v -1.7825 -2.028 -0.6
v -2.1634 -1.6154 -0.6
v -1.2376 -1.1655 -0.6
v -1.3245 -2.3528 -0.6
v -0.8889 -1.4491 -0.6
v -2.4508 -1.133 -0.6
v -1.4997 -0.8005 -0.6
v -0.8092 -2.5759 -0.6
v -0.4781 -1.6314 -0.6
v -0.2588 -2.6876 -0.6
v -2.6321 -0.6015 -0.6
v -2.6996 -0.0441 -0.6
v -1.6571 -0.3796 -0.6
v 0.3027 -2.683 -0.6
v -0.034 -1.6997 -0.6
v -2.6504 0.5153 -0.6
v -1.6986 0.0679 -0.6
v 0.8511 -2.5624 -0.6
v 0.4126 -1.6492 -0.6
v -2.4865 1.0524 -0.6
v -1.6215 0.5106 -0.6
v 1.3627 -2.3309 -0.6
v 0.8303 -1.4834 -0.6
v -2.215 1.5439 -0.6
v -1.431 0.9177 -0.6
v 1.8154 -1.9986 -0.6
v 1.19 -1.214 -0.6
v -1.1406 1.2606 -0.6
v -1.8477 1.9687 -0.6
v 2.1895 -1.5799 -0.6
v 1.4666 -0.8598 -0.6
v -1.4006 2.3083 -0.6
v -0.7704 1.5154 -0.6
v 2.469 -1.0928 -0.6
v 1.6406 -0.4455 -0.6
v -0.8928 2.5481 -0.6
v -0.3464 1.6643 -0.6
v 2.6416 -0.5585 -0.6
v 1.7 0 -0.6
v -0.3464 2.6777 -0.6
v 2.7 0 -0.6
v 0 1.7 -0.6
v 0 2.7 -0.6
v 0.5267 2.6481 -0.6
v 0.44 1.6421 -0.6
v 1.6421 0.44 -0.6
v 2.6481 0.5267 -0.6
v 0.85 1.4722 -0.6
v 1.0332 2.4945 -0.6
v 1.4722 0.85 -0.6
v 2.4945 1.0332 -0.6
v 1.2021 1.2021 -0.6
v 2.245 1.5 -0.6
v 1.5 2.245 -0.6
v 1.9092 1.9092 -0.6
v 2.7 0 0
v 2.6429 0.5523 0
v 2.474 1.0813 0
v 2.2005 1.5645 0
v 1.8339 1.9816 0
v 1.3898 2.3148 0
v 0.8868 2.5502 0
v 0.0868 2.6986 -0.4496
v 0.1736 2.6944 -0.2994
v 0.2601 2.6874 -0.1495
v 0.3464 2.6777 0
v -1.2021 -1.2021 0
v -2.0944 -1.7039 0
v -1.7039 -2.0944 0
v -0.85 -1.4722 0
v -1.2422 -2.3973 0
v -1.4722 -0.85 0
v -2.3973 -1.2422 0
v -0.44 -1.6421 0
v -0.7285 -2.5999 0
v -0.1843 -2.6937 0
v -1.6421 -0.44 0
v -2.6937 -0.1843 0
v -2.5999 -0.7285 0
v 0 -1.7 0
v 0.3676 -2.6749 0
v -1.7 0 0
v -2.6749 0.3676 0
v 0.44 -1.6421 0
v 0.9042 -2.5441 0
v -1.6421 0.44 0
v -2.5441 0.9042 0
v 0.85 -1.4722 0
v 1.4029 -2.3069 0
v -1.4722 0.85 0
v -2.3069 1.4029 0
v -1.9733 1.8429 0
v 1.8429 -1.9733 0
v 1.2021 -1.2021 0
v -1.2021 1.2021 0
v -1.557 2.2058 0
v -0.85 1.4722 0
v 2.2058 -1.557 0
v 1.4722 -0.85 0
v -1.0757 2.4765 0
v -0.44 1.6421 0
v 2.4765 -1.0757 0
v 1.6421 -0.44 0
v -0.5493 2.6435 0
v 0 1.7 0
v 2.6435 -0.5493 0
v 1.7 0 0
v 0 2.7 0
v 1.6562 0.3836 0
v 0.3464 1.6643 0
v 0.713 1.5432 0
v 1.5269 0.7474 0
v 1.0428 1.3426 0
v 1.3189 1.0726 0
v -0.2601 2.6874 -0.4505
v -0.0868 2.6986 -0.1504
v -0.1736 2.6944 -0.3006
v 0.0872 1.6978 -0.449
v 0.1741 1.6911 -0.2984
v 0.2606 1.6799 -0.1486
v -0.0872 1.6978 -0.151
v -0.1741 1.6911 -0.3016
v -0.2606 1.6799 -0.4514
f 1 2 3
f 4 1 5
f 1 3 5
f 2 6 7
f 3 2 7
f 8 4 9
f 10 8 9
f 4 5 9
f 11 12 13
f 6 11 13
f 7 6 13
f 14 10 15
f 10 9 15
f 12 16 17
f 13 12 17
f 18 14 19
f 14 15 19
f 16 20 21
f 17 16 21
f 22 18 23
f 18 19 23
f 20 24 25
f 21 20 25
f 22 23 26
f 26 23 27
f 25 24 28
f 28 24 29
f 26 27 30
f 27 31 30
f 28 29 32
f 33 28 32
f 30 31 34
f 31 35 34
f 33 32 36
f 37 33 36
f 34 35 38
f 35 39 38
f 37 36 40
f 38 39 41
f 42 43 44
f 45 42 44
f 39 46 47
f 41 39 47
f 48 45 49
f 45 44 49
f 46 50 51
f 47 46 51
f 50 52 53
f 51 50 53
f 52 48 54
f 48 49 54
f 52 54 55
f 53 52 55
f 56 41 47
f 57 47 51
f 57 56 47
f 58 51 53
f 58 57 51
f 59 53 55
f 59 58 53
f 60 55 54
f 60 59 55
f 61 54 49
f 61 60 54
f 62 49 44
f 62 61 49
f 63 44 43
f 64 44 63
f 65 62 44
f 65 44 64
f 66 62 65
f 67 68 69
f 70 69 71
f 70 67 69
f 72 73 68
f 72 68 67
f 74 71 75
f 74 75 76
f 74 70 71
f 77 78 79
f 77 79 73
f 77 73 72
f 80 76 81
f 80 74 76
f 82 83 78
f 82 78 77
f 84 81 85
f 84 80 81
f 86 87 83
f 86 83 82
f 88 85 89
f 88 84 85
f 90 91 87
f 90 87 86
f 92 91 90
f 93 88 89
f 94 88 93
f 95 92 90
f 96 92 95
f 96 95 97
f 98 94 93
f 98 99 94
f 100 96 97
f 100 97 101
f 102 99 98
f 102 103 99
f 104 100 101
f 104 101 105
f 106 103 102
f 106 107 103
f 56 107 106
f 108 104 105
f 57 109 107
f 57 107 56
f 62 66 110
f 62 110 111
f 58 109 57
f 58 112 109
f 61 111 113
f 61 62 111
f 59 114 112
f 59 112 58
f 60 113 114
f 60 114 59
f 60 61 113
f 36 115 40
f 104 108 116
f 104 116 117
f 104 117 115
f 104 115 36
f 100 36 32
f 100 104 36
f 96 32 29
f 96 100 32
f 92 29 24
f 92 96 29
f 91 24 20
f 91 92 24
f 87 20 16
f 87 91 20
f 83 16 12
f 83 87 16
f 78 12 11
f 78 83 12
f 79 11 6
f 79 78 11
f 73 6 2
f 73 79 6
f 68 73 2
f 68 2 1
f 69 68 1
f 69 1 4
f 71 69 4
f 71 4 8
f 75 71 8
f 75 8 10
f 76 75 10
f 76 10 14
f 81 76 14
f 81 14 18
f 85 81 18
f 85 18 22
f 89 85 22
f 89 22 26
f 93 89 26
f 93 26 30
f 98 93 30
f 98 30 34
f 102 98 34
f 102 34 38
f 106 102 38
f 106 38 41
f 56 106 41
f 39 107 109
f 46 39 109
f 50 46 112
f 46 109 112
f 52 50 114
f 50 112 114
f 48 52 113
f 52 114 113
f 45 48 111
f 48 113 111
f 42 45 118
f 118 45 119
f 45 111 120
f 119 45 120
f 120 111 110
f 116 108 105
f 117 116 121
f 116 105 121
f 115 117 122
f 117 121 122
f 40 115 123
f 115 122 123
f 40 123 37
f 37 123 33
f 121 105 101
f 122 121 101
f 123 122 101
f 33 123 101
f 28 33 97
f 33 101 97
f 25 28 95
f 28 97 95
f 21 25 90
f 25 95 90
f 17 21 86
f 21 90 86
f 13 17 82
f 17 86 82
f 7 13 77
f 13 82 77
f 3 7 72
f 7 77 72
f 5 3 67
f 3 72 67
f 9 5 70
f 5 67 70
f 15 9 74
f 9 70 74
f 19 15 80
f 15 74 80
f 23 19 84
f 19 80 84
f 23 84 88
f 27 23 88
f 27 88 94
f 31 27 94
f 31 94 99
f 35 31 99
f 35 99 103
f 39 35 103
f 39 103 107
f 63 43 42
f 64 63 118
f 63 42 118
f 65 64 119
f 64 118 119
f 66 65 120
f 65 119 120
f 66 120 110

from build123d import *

# Parameters (mm, degrees)
SKETCH1_R          = 2.7
SKETCH1_R_2        = 1.7
BASE_EXTRUDE_DEPTH = 0.6
CUT_EXTRUDE1_DEPTH = 4.865229618


with BuildPart() as part:
    # Sketch1 → Base-Extrude (new body)
    with BuildSketch(Plane.XY):
        Circle(SKETCH1_R)
        Circle(SKETCH1_R_2, mode=Mode.SUBTRACT)
    extrude(amount=-BASE_EXTRUDE_DEPTH)

    # Sketch2 → Cut-Extrude1 (cut, through all)
    with BuildSketch(Plane(origin=(0, 0, 0), x_dir=(1, 0, 0), z_dir=(0, 1, 0))):
        Polygon((0, 0.6), (0.346410162, 0), (0, 0), (-0.346410162, 0.6), align=None)
    extrude(amount=CUT_EXTRUDE1_DEPTH, mode=Mode.SUBTRACT)


solid = part.part
